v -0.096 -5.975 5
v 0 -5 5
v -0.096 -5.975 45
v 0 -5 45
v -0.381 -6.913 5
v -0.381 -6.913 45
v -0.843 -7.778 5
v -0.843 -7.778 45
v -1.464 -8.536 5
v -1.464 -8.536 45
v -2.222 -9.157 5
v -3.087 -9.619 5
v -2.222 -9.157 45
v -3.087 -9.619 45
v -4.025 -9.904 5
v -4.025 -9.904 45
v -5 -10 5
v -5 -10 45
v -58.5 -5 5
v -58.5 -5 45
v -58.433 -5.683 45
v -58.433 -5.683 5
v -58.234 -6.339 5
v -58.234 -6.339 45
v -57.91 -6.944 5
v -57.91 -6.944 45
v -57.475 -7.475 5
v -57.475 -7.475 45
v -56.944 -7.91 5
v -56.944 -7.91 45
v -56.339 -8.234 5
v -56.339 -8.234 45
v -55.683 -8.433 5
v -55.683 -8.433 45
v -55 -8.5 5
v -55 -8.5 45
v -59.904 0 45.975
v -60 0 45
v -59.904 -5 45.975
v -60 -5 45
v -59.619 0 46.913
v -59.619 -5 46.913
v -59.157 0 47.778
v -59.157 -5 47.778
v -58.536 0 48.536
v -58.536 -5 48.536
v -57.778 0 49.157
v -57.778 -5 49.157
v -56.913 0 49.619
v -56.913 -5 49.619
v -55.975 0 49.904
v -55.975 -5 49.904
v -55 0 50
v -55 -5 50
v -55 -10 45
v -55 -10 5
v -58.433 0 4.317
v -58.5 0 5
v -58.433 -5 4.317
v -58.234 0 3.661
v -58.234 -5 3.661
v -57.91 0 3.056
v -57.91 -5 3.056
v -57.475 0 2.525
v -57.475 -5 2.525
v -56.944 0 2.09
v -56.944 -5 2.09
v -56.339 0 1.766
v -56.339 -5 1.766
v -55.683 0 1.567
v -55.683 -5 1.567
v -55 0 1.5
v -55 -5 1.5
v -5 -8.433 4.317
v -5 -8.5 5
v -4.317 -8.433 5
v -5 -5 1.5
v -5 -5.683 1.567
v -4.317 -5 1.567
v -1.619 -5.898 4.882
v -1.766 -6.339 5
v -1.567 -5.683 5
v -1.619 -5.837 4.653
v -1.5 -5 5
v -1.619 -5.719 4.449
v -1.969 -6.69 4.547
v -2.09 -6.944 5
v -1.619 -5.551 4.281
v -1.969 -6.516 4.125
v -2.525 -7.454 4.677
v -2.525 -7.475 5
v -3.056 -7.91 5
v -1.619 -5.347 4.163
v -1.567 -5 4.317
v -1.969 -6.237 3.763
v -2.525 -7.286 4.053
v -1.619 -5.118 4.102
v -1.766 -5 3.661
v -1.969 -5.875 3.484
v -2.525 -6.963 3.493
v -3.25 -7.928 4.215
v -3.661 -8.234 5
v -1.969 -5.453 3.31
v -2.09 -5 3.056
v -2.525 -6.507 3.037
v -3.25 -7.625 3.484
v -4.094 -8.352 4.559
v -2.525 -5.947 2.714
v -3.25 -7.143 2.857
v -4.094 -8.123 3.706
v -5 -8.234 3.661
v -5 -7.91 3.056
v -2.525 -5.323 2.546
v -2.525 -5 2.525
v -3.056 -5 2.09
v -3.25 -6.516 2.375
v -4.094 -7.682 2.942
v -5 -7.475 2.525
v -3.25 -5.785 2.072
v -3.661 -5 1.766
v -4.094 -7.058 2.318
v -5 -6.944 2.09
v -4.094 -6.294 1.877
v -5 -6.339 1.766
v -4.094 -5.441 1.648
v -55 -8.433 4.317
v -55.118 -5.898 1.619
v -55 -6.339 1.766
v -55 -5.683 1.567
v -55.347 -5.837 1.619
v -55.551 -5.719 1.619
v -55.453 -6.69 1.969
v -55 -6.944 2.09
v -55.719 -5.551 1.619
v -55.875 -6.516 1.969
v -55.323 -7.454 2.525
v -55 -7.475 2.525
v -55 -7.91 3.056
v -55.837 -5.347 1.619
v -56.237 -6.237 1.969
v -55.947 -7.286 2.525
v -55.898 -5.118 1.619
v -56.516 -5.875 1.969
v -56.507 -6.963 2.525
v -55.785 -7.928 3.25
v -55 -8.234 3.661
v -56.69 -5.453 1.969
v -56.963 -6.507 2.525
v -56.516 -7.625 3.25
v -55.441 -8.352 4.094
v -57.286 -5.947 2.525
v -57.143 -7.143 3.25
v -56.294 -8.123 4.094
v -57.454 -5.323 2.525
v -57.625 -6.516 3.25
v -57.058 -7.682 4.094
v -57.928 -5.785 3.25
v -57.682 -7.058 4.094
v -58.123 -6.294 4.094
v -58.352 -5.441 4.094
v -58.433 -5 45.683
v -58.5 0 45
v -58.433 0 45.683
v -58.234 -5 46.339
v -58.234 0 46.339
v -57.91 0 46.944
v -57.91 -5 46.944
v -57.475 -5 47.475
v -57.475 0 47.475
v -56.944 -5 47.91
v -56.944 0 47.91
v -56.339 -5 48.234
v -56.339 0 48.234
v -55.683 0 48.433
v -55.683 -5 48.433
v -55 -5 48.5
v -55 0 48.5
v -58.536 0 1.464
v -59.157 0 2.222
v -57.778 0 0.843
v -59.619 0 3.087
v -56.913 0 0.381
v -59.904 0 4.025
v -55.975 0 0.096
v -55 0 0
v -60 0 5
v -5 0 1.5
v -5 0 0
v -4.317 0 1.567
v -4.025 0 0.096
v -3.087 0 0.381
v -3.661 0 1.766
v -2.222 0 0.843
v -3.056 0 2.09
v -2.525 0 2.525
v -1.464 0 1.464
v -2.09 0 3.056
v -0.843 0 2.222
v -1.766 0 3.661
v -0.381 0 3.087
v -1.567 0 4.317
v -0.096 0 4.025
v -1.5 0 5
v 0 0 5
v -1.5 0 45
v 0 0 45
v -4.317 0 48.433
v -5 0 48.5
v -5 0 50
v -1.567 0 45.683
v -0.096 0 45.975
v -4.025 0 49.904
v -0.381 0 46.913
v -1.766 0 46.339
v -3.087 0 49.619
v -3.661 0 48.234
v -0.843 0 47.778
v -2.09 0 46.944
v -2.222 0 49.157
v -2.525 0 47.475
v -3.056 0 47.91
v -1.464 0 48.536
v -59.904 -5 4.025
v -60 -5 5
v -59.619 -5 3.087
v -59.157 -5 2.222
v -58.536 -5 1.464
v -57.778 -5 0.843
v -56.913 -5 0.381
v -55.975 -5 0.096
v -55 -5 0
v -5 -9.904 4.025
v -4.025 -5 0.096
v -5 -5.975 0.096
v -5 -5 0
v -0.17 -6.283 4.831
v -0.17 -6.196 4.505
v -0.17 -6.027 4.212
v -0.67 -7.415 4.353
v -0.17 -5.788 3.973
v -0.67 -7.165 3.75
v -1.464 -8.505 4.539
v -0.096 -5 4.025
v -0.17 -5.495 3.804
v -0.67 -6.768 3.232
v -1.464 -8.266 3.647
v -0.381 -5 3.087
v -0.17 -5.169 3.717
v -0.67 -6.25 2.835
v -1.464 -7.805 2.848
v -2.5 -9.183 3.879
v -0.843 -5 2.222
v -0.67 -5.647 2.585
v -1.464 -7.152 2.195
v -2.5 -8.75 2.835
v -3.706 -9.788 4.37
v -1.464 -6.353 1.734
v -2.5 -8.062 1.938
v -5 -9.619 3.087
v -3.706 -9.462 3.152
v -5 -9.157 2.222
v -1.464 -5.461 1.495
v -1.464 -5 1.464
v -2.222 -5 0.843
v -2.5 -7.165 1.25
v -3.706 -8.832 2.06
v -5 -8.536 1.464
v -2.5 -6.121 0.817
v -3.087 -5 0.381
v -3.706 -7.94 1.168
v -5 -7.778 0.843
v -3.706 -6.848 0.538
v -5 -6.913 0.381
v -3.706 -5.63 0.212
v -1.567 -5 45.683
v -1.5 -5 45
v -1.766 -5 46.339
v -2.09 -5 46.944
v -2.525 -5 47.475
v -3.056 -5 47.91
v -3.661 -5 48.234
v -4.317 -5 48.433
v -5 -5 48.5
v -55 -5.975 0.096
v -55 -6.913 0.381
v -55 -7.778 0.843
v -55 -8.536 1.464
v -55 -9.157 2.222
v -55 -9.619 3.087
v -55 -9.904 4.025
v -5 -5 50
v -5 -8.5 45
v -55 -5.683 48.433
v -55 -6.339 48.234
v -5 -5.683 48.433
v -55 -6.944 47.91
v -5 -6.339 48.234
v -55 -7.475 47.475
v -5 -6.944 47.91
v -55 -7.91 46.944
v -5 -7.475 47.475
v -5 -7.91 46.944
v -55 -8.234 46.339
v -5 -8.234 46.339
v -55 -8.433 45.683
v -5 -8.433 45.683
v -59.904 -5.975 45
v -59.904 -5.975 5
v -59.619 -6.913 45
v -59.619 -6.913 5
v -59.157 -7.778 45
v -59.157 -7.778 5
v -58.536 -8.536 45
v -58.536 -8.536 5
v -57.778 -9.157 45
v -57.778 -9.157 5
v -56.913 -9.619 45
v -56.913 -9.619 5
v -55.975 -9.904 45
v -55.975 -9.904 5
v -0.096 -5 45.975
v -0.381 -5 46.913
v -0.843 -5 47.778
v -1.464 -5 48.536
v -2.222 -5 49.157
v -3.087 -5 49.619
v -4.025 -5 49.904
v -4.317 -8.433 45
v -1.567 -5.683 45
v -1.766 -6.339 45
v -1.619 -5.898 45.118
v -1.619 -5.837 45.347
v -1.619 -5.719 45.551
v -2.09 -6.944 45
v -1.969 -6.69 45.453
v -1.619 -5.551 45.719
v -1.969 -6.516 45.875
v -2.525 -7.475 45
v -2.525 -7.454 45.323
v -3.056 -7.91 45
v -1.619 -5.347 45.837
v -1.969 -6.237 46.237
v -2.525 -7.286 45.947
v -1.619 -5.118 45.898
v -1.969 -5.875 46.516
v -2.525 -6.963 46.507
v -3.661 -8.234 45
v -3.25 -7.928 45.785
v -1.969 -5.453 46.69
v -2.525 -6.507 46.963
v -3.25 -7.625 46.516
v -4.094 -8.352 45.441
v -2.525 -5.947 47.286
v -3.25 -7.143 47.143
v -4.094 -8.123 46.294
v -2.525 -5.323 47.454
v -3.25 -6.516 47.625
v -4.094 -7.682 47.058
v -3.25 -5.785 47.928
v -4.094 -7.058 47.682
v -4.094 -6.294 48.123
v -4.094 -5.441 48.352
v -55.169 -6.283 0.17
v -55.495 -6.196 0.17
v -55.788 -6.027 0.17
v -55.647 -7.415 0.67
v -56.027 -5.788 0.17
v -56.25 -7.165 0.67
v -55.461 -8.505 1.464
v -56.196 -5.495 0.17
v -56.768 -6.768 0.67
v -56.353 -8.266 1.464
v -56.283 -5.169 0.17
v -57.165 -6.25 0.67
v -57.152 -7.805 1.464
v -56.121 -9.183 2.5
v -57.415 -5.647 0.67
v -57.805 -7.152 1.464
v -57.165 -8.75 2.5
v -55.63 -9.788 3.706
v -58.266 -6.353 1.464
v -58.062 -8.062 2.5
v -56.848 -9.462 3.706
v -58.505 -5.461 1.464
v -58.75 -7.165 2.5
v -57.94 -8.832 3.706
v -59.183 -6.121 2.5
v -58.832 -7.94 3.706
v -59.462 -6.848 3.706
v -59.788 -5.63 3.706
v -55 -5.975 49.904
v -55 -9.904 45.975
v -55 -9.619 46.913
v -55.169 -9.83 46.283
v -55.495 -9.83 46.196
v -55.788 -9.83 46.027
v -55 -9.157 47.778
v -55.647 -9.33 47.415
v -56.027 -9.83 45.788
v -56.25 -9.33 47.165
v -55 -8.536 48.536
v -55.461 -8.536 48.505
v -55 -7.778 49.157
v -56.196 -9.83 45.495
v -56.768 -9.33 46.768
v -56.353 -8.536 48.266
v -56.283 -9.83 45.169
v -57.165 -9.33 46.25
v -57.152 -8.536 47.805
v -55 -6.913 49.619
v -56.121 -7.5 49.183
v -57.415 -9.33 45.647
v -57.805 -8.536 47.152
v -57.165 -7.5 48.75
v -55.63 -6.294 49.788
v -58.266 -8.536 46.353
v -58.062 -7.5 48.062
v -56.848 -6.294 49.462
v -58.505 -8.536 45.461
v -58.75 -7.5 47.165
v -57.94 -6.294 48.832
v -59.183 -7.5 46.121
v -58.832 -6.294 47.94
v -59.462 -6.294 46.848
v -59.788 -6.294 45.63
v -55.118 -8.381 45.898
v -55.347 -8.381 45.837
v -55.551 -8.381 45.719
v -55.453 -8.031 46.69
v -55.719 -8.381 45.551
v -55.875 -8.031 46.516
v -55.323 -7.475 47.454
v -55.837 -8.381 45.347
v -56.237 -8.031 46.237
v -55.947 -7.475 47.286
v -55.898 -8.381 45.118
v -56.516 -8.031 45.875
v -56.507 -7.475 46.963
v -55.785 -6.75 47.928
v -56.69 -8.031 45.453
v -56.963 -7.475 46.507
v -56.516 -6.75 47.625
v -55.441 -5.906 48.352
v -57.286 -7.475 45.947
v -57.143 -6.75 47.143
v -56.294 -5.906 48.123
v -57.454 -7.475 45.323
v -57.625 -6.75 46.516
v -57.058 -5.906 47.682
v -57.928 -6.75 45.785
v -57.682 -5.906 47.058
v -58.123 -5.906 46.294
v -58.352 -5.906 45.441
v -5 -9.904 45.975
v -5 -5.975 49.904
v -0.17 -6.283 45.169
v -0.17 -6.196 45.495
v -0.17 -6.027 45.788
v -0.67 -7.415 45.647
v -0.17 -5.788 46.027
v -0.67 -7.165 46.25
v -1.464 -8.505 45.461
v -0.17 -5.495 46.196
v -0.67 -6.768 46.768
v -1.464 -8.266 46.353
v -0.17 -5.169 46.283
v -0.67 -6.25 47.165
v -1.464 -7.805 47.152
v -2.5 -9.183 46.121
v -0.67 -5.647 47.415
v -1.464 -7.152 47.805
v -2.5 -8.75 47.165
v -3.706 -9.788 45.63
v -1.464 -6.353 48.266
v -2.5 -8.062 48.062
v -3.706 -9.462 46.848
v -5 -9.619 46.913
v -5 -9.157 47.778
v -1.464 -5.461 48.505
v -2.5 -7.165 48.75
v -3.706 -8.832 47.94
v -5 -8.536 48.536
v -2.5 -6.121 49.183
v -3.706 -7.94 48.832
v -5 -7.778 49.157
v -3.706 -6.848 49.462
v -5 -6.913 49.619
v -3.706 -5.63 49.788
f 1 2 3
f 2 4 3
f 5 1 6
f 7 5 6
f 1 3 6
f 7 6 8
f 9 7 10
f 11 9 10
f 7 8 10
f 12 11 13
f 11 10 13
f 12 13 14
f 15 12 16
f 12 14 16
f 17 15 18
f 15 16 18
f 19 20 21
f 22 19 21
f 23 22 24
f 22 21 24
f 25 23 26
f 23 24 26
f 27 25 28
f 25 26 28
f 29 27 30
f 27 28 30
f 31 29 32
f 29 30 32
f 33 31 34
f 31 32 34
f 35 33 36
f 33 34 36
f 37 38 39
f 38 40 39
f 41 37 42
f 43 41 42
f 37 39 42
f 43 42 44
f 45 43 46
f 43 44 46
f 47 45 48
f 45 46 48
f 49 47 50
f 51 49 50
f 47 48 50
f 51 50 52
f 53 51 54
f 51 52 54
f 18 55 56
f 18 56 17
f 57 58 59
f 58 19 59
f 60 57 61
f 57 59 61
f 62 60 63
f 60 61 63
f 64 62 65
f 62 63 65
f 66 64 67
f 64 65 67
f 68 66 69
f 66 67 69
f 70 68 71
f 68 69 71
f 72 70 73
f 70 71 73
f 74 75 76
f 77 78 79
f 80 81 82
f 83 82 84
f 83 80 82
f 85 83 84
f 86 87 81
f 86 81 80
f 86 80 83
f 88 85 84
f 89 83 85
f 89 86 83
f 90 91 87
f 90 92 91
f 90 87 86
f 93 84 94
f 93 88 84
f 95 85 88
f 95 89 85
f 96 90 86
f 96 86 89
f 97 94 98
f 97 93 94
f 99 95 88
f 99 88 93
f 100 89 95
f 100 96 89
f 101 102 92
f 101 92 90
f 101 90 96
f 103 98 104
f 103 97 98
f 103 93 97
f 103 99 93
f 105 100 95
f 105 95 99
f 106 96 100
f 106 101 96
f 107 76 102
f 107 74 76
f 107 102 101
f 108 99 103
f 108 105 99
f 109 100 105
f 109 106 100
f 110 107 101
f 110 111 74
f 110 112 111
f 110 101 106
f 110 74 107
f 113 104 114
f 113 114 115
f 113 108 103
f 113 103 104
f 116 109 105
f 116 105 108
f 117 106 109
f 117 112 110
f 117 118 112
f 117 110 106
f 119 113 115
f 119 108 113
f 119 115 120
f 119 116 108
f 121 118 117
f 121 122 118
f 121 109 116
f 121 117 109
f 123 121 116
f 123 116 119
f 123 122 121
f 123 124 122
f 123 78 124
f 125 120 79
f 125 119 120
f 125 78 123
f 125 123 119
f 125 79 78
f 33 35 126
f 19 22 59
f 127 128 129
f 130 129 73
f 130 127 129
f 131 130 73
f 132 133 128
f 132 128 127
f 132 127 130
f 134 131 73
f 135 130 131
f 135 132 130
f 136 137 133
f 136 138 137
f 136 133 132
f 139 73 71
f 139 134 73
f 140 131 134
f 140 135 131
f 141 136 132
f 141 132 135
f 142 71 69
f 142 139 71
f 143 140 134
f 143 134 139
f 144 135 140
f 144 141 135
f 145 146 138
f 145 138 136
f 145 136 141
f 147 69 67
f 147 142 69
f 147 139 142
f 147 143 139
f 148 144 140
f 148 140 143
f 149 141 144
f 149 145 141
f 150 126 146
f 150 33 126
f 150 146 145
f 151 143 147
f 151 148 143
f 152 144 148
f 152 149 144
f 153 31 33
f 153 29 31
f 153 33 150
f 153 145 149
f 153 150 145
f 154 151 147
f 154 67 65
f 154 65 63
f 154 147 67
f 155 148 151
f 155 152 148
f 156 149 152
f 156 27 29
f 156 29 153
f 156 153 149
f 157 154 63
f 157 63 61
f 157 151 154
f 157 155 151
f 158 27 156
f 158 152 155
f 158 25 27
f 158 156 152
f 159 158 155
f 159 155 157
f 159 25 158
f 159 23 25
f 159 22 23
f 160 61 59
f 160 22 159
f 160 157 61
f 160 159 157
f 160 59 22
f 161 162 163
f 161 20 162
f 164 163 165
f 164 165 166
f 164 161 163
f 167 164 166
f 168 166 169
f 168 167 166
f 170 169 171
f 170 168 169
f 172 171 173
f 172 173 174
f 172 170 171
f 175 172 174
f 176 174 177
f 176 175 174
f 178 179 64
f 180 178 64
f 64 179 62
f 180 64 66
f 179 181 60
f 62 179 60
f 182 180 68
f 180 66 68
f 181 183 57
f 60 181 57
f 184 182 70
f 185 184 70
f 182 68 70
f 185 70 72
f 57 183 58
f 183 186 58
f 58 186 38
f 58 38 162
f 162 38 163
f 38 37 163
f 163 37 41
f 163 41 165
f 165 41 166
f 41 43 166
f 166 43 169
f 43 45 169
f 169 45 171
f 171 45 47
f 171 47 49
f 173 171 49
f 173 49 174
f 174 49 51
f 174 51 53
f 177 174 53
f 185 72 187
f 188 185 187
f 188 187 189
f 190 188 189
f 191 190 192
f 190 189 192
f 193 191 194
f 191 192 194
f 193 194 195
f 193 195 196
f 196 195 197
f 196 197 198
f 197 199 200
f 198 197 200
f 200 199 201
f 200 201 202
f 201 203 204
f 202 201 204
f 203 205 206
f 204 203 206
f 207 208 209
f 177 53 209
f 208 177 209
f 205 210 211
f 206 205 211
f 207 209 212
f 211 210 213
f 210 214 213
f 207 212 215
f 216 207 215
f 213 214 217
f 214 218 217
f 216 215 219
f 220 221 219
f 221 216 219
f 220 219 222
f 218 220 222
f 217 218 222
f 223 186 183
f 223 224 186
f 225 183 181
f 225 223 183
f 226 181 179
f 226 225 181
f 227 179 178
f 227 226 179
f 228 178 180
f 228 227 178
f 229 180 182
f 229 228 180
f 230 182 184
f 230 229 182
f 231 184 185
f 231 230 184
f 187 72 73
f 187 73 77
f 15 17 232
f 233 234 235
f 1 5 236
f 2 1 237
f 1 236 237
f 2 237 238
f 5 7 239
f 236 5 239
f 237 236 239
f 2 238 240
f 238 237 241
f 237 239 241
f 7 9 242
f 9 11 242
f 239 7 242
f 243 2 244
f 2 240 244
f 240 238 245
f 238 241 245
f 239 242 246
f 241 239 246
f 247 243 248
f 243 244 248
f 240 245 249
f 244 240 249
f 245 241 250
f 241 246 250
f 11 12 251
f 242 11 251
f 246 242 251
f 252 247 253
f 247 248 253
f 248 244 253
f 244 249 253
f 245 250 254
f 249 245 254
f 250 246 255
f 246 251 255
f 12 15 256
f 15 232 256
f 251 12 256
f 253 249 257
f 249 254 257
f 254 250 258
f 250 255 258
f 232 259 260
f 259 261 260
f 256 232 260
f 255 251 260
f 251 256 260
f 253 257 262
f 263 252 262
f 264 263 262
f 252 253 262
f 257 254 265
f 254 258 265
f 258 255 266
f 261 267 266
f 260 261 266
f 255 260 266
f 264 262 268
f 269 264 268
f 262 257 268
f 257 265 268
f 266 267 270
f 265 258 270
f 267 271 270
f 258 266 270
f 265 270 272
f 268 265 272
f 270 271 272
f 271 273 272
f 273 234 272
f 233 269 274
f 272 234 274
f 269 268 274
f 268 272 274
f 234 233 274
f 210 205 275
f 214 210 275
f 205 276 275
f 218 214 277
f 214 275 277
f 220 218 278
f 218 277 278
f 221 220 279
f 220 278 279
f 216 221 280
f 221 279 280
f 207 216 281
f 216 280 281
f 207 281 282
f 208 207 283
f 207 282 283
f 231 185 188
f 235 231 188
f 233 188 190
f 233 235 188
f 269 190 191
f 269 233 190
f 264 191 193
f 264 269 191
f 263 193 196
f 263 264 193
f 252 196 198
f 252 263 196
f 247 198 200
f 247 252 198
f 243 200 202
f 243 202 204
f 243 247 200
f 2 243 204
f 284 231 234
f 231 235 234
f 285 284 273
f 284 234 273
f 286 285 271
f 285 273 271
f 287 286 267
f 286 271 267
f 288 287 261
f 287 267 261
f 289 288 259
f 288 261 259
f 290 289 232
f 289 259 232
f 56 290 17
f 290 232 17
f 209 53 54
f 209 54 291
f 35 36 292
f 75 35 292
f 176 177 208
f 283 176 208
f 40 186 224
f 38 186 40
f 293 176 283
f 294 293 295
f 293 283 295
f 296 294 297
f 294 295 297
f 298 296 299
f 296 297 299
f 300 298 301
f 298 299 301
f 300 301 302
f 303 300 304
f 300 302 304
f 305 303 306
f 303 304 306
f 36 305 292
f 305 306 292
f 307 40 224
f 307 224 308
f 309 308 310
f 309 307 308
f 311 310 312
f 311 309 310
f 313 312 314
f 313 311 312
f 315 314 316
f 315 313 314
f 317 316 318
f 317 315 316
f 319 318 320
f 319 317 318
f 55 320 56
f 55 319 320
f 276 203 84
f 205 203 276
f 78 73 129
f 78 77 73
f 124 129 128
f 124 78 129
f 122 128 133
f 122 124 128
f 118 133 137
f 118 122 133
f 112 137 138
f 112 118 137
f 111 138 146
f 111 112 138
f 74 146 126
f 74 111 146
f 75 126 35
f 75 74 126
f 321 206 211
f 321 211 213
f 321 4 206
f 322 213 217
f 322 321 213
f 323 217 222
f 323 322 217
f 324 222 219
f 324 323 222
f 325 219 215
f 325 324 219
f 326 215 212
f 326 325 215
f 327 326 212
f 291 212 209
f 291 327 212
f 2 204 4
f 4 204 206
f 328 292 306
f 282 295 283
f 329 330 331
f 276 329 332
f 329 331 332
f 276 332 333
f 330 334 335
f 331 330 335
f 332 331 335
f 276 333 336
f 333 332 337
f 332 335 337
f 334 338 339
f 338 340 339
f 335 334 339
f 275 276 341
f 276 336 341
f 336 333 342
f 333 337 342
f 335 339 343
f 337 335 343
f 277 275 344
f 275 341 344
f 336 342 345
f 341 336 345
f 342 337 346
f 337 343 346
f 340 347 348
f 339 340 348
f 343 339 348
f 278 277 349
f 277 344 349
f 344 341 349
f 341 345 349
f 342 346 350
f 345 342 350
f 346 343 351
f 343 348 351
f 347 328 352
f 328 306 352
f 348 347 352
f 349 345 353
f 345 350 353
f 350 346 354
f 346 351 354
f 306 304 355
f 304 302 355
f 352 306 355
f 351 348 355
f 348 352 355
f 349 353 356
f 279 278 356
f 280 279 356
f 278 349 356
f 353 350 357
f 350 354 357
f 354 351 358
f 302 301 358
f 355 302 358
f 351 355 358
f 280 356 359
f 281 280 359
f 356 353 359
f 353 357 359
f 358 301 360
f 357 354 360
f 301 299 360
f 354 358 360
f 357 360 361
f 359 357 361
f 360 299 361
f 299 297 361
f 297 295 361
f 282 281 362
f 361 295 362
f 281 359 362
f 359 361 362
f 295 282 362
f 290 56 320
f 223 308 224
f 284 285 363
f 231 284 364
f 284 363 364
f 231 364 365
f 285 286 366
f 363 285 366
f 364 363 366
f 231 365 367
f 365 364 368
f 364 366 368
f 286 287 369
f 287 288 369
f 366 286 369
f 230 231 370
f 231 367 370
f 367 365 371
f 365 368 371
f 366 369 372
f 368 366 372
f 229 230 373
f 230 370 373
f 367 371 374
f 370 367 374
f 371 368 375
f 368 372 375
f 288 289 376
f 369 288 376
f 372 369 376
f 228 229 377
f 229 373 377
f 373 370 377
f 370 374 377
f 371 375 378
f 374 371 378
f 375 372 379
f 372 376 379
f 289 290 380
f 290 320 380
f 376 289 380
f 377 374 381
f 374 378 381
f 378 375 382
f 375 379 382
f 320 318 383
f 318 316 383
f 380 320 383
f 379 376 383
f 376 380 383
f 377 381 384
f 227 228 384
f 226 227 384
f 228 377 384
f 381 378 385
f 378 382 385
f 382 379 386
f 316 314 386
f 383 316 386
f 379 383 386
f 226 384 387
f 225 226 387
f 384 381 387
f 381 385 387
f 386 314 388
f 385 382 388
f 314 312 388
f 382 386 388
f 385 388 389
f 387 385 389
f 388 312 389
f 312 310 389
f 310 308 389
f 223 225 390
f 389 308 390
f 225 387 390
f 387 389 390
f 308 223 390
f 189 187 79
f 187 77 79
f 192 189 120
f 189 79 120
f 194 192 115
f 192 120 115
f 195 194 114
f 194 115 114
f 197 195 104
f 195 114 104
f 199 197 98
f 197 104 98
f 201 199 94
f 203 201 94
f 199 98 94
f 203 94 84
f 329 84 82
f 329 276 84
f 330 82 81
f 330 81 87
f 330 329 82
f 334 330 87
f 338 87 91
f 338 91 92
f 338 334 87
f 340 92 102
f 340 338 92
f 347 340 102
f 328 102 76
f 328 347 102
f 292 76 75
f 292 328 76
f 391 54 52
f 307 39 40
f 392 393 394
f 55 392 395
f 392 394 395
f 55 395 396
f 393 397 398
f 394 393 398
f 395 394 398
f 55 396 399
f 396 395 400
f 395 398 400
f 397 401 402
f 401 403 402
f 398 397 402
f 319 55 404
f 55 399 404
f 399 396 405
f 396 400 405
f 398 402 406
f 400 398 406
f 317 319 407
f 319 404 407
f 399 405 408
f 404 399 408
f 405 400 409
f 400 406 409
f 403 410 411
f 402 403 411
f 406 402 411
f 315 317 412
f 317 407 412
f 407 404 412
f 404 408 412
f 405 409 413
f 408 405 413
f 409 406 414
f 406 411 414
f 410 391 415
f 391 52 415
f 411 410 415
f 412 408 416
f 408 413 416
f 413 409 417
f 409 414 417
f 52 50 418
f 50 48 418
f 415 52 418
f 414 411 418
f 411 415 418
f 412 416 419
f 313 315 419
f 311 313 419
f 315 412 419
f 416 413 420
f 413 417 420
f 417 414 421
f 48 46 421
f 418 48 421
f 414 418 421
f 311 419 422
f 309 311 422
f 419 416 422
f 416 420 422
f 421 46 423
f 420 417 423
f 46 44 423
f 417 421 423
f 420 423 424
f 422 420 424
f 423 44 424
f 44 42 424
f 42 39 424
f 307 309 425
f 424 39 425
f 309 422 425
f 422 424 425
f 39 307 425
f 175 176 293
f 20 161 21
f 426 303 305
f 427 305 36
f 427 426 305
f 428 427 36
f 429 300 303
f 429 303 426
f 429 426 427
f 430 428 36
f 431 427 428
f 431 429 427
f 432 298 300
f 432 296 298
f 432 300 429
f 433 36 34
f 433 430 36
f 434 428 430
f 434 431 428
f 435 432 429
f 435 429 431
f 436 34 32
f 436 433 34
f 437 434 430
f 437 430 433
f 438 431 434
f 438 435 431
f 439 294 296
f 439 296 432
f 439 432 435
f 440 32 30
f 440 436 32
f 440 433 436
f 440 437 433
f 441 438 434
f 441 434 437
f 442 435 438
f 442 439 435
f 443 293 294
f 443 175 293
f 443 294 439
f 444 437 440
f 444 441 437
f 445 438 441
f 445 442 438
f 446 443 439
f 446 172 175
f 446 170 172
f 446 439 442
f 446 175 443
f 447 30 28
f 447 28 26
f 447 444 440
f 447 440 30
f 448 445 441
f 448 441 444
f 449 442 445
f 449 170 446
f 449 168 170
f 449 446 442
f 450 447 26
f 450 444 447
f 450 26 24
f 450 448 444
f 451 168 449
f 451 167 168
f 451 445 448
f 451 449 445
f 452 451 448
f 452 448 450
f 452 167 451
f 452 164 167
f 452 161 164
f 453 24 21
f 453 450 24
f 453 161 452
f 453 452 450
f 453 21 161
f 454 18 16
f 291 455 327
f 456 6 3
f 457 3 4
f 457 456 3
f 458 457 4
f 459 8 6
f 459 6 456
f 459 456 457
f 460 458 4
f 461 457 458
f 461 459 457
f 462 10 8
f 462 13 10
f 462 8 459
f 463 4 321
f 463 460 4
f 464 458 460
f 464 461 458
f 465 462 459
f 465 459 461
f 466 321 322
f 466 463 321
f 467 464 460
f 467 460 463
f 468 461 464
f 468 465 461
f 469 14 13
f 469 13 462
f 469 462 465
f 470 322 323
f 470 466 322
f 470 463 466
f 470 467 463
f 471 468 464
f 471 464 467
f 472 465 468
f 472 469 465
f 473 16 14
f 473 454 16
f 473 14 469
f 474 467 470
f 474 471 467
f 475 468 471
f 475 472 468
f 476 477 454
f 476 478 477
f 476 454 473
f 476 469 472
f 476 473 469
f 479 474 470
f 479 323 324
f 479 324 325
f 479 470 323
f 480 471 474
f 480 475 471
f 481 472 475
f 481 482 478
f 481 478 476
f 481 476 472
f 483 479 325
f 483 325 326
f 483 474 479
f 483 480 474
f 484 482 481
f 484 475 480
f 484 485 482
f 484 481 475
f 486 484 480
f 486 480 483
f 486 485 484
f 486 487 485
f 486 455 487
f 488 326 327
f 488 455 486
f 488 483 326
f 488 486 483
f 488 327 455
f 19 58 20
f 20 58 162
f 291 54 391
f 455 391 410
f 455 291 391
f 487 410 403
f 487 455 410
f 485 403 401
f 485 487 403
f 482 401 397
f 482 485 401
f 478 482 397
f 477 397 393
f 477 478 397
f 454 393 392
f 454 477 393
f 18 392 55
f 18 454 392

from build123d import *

# Parameters (mm, degrees)
F0_W     = 60
F0_H     = 50
F1_DEPTH = 10
F2_R     = 5
F3_T     = -1.5


with BuildPart() as f1:
    # F0 (on Front) → F1 (new body)
    with BuildSketch(Plane.XZ):
        with Locations((-30, 25)):
            Rectangle(F0_W, F0_H)
    extrude(amount=F1_DEPTH)

    # F2
    f2_edges = [f1.edges().sort_by_distance(p)[0] for p in [
        (-60, -5, 50),
        (-30, -10, 50),
        (-60, -10, 25),
        (-30, -10, 0),
        (0, -10, 25),
        (0, -5, 50),
        (-60, -5, 0),
        (0, -5, 0),
    ]]
    fillet(f2_edges, radius=F2_R)

    # F3
    f3_openings = [f1.faces().sort_by_distance(p)[0] for p in [
        (-30, 0, 25),
    ]]
    offset(amount=F3_T, openings=f3_openings)


solid = f1.part
